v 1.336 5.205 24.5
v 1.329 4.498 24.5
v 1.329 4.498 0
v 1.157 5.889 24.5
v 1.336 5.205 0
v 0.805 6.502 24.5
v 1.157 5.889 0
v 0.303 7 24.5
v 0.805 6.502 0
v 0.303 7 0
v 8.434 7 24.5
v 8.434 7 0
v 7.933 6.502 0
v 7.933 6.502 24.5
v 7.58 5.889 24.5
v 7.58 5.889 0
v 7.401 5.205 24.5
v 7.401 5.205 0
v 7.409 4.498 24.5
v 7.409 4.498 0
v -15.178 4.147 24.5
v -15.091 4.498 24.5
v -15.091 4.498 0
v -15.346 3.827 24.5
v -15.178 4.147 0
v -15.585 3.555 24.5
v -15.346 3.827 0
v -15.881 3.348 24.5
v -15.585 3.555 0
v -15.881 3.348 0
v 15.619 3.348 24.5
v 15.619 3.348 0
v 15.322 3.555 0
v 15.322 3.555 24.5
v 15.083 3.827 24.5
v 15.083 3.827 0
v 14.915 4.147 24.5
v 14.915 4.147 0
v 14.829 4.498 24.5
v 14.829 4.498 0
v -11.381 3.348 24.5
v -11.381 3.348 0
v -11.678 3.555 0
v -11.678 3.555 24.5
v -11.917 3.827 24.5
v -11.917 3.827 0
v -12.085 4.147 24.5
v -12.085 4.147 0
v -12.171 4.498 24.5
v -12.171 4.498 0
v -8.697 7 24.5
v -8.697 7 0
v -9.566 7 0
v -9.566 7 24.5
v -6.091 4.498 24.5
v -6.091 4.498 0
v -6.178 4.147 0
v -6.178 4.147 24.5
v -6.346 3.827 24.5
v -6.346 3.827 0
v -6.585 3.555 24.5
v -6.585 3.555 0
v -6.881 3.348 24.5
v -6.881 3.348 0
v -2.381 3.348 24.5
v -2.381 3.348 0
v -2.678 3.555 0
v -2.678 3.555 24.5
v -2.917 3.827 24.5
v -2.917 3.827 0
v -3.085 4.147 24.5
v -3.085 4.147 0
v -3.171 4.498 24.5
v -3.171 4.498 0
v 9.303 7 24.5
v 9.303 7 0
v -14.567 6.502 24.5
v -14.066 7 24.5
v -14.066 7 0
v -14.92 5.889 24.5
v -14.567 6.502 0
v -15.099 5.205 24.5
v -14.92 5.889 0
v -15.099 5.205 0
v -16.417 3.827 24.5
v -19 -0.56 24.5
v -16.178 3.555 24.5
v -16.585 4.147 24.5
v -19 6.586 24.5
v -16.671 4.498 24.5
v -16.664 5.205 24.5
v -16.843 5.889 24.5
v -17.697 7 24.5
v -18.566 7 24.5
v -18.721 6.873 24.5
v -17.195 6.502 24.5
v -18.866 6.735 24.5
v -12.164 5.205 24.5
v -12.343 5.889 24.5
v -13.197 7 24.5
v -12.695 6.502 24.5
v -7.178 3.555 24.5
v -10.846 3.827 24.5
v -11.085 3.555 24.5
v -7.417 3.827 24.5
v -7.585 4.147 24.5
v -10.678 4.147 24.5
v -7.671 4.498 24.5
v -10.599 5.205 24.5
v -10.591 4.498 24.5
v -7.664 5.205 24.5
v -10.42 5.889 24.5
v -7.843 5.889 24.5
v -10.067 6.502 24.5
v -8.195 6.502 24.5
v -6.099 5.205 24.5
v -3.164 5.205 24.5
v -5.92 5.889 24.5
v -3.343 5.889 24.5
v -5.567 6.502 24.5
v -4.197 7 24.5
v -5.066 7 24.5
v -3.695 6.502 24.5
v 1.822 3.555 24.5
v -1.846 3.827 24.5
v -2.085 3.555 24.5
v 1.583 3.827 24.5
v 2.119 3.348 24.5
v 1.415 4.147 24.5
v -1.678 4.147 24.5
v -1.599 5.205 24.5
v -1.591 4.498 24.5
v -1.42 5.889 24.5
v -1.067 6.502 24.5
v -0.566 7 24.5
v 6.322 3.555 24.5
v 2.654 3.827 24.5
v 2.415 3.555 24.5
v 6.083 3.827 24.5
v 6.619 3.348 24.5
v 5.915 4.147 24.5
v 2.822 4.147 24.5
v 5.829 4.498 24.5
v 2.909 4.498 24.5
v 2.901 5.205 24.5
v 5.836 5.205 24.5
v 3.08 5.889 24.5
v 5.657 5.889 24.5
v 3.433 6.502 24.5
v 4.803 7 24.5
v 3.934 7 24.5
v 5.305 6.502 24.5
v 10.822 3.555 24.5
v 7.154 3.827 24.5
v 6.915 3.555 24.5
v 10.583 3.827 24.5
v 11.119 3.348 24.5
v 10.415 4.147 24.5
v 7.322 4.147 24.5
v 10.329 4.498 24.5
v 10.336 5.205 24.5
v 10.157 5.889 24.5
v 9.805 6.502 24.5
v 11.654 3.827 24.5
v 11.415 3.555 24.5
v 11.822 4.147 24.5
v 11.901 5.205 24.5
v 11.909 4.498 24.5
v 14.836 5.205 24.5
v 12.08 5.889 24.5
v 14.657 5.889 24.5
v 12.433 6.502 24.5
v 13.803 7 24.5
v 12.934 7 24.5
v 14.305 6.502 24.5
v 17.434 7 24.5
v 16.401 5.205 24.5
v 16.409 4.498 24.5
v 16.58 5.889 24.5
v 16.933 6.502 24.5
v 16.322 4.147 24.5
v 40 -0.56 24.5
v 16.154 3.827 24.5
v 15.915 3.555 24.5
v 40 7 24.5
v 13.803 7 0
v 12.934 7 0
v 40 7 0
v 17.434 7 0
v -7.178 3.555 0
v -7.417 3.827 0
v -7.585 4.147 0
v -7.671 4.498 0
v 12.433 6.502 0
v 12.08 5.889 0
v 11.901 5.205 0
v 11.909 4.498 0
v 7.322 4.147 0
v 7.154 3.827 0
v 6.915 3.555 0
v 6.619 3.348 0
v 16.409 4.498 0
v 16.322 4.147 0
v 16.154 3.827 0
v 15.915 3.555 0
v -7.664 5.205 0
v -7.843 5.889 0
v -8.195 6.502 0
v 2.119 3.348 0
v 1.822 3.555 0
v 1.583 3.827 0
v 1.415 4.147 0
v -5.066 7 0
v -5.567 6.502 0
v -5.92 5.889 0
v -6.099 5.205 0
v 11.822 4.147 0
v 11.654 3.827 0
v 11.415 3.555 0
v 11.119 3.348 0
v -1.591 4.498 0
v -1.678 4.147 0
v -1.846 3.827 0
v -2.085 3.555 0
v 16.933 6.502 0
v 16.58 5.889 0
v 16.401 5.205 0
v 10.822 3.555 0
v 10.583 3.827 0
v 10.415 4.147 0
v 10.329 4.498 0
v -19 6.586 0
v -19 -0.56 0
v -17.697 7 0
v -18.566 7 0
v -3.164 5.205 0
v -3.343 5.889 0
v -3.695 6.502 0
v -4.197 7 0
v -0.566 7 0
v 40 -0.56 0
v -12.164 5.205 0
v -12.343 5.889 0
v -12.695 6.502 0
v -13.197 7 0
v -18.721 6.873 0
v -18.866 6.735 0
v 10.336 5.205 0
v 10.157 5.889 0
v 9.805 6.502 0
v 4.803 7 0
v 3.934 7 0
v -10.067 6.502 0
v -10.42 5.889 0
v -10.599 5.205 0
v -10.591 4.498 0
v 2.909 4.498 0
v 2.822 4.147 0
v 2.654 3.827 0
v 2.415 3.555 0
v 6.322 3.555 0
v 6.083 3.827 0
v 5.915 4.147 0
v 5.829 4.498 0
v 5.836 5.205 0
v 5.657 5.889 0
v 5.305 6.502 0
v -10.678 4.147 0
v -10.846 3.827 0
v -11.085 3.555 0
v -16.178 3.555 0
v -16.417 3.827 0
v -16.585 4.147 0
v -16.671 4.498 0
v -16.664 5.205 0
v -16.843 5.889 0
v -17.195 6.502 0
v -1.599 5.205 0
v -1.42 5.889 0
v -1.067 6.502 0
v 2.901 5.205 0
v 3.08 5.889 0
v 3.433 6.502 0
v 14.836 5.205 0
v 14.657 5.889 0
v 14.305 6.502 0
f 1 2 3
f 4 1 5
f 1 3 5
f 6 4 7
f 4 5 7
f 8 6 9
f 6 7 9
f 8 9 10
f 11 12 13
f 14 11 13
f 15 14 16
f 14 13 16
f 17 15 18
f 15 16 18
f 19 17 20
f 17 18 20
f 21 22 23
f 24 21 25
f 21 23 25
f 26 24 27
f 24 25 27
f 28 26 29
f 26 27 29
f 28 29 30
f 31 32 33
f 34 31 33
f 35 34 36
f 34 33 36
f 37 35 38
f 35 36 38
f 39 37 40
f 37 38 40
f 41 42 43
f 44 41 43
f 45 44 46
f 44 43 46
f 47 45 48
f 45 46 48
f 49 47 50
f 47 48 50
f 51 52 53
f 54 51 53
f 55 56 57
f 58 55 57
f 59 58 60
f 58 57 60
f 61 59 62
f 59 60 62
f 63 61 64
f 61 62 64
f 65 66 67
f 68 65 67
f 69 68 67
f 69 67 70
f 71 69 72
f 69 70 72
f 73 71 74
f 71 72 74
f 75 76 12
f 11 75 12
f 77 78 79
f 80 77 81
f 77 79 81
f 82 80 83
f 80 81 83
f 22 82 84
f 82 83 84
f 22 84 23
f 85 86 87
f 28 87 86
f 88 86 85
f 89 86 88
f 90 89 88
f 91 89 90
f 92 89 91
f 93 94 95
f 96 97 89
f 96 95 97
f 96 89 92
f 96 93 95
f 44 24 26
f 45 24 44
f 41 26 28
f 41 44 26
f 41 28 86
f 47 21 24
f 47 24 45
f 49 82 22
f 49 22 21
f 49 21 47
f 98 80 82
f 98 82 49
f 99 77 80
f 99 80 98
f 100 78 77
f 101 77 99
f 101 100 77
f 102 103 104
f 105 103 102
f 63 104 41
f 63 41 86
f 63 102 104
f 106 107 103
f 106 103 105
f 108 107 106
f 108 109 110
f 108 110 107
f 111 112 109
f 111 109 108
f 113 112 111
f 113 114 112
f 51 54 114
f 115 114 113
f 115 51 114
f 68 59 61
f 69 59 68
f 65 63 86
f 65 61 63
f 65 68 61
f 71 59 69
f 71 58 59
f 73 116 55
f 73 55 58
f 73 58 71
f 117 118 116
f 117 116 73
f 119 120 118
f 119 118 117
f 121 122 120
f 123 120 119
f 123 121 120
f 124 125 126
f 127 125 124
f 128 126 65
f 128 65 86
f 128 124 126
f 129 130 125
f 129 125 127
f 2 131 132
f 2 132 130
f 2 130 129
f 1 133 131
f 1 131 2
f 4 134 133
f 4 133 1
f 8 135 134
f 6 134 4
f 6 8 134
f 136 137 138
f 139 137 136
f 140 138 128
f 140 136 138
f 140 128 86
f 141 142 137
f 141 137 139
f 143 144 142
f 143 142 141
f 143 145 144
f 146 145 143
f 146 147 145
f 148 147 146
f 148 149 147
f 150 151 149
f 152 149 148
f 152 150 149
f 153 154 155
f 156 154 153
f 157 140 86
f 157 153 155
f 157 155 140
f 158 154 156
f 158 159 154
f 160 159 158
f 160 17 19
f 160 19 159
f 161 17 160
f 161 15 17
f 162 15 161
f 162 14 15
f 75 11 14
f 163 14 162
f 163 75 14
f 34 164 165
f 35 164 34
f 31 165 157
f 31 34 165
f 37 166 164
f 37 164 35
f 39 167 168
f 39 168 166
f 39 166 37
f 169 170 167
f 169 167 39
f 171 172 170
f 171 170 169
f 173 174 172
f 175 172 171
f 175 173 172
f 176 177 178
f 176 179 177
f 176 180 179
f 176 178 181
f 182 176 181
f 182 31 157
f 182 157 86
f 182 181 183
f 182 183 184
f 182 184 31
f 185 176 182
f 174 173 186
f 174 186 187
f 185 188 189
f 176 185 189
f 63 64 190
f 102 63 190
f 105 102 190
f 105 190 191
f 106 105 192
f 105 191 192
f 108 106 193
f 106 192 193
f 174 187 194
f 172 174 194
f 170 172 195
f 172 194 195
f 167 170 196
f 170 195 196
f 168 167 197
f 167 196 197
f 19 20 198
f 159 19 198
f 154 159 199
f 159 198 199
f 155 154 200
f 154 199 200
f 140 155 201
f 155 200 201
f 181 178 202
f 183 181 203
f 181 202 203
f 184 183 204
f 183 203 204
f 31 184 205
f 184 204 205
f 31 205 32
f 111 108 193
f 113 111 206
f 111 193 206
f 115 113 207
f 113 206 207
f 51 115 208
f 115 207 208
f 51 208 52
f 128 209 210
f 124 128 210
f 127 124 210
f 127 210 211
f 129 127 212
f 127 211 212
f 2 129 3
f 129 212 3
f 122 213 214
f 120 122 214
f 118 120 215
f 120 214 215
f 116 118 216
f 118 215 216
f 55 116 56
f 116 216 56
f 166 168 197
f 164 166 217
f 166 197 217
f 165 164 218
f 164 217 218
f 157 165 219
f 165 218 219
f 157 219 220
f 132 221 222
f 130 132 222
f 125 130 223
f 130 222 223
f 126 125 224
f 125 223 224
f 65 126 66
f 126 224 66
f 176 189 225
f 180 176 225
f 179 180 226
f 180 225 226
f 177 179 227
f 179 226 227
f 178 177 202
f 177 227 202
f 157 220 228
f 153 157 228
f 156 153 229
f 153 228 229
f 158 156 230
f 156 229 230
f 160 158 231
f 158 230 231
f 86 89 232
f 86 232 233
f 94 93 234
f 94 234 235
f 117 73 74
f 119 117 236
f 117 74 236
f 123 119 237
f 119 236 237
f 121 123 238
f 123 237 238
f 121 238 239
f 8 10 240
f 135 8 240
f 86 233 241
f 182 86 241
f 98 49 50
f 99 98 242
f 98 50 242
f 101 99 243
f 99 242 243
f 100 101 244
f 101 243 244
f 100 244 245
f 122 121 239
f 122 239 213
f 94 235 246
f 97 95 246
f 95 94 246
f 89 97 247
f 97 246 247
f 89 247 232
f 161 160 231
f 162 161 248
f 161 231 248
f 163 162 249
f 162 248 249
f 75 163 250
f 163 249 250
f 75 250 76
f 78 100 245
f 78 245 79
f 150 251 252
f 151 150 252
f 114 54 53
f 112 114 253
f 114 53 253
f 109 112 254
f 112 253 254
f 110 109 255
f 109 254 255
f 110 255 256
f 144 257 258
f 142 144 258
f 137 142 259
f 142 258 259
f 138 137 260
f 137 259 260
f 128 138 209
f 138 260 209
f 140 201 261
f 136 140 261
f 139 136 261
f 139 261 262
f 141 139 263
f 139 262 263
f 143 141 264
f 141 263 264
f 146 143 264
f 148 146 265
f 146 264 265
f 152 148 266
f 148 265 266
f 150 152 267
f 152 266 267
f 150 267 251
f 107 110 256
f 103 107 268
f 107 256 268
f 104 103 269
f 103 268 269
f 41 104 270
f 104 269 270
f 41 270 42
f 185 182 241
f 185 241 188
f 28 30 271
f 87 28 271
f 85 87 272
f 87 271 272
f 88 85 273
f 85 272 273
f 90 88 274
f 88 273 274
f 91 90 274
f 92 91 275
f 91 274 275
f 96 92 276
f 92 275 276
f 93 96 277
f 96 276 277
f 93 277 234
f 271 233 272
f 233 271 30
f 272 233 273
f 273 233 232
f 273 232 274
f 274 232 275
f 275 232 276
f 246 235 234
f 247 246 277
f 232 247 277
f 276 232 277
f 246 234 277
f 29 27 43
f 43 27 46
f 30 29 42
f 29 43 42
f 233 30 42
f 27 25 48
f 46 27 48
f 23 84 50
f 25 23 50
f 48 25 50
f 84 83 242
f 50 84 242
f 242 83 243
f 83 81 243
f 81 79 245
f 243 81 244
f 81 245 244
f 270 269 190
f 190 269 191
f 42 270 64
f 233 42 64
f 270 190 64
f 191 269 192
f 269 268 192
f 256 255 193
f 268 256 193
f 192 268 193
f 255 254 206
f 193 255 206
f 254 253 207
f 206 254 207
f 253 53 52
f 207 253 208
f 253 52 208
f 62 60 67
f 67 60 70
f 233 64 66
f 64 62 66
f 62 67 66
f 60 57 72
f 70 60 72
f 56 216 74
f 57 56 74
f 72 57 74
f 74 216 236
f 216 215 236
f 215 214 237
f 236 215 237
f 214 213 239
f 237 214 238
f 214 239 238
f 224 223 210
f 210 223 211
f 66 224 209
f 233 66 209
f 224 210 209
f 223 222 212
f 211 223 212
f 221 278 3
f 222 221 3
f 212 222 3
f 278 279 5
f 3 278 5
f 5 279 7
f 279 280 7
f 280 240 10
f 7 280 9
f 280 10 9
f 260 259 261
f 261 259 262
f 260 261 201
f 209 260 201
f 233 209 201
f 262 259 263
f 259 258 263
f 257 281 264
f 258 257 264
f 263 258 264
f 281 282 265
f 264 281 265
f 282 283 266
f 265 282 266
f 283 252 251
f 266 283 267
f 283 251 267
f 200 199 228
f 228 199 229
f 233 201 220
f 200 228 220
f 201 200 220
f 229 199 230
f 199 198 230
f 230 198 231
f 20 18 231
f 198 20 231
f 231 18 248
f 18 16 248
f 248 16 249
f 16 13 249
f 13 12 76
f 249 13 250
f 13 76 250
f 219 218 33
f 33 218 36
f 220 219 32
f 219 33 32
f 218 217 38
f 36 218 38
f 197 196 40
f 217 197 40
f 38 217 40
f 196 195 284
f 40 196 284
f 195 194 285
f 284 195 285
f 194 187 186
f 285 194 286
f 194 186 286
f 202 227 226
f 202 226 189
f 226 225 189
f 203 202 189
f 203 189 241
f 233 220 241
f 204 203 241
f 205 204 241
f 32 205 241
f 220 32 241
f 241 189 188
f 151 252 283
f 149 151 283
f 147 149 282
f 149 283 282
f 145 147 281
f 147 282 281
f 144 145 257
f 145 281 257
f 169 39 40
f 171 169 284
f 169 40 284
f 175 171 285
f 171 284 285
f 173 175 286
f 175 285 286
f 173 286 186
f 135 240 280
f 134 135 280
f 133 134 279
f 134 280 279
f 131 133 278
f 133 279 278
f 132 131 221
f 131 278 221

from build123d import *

# Parameters (mm, degrees)
BOSS_EXTRUDE1_DEPTH = 24.5
CUT_EXTRUDE1_DEPTH  = 26.12
LPATTERN1_COUNT     = 4
LPATTERN1_PITCH     = 4.5
LPATTERN1_COL_COUNT = 6
LPATTERN1_COL_PITCH = 4.5


with BuildPart() as part:
    # Sketch1 → Boss-Extrude1 (new body)
    with BuildSketch(Plane.XY):
        Polygon((4, 7), (-19, 7), (-19, -0.560353425), (0.939234275, -0.560353425), (40, -0.560353425), (40, 7), align=None)
    extrude(amount=BOSS_EXTRUDE1_DEPTH)

    # Sketch2 → Cut-Extrude1 (cut)
    with BuildSketch(Plane.XY):
        with BuildLine():
            ThreePointArc((-6.881285782, 3.348371163), (-7.417069895, 3.826658598), (-7.671285782, 4.498371163))
            ThreePointArc((-7.671285782, 4.498371163), (-7.912320341, 6.04482582), (-8.981285782, 7.188037328))
            ThreePointArc((-8.981285782, 7.188037328), (-6.881285782, 7.762283268), (-4.781285782, 7.188037328))
            ThreePointArc((-4.781285782, 7.188037328), (-5.850251222, 6.04482582), (-6.091285782, 4.498371163))
            ThreePointArc((-6.091285782, 4.498371163), (-6.345501668, 3.826658598), (-6.881285782, 3.348371163))
        make_face()
    cut_extrude1 = extrude(amount=CUT_EXTRUDE1_DEPTH, mode=Mode.SUBTRACT)

    # LPattern1: Cut-Extrude1 ×4
    with Locations(*[(-i * LPATTERN1_PITCH, 0, 0) for i in range(1, LPATTERN1_COUNT)]):
        add(cut_extrude1, mode=Mode.SUBTRACT)

    # LPattern1 col: Cut-Extrude1 ×6
    with Locations(*[(i * LPATTERN1_COL_PITCH, 0, 0) for i in range(1, LPATTERN1_COL_COUNT)]):
        add(cut_extrude1, mode=Mode.SUBTRACT)


solid = part.part
